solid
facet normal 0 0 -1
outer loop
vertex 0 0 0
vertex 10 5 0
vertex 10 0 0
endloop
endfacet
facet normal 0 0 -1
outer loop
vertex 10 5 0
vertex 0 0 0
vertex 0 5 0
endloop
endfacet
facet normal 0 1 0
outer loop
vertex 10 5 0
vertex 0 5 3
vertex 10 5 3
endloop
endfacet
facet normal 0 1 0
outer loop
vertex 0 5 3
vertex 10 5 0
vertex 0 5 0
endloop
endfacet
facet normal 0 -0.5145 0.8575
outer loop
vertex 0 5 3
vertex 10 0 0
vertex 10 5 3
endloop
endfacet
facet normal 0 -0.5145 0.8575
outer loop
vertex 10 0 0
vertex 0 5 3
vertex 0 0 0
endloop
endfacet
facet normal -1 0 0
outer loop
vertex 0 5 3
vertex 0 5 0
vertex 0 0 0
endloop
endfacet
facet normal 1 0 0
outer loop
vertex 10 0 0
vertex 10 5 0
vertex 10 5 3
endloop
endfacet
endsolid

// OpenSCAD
module prism(l, w, h){
    polyhedron(
        points=[[0,0,0], [l,0,0], [l,w,0], [0,w,0], [0,w,h], [l,w,h]],
        faces=[[0,1,2,3],[5,4,3,2],[0,4,5,1],[0,3,4],[5,2,1]]
    );
}

prism(10, 5, 3);
